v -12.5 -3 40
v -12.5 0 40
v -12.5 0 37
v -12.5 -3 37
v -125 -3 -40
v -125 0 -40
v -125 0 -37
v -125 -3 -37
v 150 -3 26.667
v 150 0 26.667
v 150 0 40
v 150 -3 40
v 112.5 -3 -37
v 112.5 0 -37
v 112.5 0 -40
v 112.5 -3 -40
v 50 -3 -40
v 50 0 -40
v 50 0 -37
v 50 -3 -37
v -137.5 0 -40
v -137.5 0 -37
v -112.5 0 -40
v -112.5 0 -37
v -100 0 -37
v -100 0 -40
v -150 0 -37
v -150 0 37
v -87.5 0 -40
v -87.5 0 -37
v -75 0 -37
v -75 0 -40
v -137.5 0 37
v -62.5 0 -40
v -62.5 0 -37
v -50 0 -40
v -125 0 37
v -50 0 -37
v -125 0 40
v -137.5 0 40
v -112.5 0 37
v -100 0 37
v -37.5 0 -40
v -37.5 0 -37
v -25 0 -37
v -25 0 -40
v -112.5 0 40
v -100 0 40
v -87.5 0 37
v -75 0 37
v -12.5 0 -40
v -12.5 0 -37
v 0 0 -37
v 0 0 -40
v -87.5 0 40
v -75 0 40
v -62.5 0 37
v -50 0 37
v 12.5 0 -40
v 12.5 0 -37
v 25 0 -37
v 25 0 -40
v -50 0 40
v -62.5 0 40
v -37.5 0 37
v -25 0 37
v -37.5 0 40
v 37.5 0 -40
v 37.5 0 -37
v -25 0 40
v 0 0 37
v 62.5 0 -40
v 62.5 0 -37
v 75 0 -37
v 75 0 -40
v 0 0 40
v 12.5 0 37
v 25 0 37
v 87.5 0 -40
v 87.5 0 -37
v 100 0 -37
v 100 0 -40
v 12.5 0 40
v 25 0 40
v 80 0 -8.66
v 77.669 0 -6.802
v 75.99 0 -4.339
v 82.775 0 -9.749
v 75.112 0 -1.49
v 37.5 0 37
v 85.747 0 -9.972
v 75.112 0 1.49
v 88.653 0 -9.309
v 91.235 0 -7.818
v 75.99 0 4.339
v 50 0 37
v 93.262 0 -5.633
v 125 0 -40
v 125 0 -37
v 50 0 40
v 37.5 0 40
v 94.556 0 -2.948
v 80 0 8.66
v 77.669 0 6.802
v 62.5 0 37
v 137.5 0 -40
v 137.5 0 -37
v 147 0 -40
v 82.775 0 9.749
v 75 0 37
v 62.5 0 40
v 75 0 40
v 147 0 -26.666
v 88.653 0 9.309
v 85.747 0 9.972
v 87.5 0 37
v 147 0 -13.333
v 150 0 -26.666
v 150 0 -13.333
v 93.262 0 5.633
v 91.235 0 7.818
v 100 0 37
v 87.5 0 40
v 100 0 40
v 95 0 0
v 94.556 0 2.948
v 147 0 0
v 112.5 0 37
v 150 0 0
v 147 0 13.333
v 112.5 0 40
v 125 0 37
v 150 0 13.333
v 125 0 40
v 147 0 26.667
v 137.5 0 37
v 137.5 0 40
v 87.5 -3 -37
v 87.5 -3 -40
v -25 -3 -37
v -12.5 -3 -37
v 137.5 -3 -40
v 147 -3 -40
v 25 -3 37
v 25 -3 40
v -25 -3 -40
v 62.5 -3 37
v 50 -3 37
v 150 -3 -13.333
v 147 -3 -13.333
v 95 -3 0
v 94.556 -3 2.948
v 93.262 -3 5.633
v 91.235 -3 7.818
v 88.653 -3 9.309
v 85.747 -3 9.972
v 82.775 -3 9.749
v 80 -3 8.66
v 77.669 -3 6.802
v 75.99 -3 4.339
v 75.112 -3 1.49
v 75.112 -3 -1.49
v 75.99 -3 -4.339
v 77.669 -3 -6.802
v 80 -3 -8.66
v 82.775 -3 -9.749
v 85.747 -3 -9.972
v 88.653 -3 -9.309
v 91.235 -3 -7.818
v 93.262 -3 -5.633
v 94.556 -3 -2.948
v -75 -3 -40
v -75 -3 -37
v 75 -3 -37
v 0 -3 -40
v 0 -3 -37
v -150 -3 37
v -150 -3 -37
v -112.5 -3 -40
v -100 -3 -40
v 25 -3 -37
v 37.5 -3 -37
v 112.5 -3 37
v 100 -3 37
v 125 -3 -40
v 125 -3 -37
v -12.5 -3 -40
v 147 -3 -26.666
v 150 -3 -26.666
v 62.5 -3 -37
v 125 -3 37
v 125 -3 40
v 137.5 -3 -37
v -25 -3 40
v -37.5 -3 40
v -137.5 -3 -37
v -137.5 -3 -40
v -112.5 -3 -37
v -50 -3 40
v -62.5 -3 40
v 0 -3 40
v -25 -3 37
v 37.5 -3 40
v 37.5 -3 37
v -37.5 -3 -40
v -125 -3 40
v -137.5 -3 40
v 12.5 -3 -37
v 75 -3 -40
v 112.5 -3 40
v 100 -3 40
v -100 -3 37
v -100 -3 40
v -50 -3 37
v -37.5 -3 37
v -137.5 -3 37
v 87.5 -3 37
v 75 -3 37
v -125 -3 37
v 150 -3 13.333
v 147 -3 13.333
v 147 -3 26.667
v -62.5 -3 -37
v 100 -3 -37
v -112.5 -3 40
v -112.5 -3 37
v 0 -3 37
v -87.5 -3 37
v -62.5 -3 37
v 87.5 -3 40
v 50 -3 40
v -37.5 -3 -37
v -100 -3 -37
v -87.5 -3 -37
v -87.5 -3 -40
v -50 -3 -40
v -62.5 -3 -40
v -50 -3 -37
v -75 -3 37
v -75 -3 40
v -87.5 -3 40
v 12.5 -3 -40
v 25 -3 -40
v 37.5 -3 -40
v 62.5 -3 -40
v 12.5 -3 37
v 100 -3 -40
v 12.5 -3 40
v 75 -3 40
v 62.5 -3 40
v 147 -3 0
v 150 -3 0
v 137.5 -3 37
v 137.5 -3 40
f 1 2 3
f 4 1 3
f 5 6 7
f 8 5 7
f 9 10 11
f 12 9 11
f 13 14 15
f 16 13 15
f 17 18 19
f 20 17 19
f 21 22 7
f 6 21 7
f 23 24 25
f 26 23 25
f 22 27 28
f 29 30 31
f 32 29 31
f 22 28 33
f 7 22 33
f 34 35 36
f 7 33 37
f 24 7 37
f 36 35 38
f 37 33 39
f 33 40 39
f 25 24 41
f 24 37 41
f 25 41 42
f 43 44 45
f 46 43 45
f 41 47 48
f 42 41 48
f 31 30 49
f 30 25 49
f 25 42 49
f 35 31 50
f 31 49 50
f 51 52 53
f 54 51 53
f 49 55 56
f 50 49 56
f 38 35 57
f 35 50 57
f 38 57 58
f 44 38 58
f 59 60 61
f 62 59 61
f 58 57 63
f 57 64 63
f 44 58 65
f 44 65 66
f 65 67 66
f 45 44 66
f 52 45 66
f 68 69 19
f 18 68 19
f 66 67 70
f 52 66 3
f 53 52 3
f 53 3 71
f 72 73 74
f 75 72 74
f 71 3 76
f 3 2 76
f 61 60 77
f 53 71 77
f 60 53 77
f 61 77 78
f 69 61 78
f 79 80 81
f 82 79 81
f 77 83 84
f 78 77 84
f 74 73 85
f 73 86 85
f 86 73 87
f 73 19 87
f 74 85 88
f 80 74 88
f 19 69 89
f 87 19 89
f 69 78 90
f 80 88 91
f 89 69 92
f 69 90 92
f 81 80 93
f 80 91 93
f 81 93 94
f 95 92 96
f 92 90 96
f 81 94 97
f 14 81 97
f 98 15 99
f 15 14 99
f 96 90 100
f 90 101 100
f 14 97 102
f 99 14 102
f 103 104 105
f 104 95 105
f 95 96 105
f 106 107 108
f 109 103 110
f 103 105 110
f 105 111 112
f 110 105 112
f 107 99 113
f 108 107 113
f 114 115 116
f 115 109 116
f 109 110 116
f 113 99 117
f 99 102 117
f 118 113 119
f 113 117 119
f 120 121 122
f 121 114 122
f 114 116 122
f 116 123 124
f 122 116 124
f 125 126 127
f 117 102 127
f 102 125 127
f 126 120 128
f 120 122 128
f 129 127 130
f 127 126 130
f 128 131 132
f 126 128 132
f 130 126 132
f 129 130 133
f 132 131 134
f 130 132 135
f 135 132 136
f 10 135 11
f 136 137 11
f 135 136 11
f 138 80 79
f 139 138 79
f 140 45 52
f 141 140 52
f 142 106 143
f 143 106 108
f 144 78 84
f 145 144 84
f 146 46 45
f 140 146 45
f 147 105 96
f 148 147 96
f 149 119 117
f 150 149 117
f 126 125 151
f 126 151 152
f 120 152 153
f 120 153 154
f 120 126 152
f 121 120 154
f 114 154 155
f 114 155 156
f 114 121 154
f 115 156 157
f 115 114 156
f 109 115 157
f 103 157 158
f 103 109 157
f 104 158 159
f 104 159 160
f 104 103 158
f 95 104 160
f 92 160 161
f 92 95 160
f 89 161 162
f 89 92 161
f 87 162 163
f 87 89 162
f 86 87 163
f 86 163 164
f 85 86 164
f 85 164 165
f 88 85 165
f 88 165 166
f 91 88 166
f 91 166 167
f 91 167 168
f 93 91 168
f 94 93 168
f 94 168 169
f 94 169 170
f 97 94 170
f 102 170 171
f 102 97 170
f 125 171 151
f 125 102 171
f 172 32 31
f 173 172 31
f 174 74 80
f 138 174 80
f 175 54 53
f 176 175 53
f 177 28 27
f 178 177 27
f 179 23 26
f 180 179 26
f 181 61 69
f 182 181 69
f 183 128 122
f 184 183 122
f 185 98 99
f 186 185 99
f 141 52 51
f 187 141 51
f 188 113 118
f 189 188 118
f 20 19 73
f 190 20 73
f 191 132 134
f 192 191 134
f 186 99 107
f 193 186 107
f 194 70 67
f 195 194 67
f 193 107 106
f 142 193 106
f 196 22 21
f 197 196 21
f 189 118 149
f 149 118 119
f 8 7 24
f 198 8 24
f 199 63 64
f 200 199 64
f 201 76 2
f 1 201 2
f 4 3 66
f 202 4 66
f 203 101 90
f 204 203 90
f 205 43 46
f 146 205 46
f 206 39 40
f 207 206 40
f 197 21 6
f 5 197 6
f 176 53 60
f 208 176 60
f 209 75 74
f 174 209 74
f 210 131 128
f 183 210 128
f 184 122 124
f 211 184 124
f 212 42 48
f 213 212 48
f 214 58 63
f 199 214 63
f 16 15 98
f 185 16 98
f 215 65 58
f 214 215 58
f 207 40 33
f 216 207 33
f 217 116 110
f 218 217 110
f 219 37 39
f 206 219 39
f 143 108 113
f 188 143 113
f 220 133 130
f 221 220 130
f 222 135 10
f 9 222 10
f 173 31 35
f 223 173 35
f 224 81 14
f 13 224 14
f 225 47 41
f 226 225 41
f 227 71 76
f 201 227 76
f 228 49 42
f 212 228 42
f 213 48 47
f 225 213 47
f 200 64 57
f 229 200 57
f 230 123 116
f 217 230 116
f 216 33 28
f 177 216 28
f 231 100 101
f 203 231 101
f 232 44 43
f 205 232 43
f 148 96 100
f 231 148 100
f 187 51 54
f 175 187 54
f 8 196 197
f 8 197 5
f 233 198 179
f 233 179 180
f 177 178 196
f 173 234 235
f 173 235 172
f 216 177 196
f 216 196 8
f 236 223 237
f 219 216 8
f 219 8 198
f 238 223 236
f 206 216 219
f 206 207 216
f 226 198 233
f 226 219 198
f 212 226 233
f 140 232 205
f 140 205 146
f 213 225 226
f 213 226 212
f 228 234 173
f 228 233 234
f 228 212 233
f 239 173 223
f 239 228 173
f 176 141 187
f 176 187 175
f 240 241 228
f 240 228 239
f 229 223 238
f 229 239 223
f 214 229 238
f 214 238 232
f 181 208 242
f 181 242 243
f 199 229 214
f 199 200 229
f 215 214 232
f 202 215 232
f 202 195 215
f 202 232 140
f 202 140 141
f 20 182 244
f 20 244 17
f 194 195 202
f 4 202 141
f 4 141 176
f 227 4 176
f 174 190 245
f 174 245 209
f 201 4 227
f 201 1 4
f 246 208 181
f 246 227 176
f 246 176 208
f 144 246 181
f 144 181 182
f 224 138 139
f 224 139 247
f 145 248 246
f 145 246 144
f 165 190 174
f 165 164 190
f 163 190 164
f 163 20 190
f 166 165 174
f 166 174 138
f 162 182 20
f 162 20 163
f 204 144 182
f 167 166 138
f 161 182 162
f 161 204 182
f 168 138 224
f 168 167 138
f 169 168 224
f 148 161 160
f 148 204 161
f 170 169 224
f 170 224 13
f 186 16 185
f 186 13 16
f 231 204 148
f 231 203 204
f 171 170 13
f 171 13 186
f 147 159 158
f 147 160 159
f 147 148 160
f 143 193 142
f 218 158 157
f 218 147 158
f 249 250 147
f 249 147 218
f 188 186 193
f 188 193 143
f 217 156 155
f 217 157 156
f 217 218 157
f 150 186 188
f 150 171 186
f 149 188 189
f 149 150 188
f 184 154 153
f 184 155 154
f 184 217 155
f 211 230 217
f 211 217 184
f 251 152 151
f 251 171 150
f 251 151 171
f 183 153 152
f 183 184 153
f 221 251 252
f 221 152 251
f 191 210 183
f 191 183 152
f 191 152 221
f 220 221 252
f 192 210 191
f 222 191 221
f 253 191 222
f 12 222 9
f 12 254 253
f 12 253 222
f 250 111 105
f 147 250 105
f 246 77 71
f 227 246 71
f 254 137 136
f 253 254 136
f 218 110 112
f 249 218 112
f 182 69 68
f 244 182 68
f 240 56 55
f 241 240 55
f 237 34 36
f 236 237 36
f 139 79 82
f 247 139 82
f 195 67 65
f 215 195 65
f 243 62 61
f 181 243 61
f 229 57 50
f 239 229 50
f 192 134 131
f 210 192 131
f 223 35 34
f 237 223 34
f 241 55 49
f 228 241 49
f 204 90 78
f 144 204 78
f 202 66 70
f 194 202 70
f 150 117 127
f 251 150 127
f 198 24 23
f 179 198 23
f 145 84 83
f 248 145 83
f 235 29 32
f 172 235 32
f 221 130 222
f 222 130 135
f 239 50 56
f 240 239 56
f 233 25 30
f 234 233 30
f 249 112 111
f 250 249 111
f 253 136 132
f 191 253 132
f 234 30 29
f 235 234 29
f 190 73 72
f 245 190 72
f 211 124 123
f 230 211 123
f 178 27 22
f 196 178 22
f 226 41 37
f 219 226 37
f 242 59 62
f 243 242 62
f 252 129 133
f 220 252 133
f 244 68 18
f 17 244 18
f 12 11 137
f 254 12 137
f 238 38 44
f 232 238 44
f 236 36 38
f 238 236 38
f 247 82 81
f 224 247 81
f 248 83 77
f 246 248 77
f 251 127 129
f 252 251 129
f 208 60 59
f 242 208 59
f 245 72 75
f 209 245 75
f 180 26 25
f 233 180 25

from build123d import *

# Parameters (mm, degrees)
F0_R     = 10
F1_DEPTH = 3


with BuildPart() as f1:
    # F0 (on Front) → F1 (new body)
    with BuildSketch(Plane.XZ):
        Polygon((147, -26.6665), (150, -26.6665), (150, -13.3332), (147, -13.3332), (147, 0.0001), (150, 0.0001), (150, 13.3334), (147, 13.3334), (147, 26.6667), (150, 26.6667), (150, 40), (137.5, 40), (137.5, 36.99985), (125, 36.99985), (125, 40), (112.5, 40), (112.5, 36.99985), (100, 36.99985), (100, 40), (87.5, 40), (87.5, 36.99985), (75, 36.99985), (75, 40), (62.5, 40), (62.5, 36.99985), (50, 36.99985), (50, 40), (37.5, 40), (37.5, 36.99985), (25, 36.99985), (25, 40), (12.5, 40), (12.5, 36.99985), (0, 36.99985), (0, 40), (-12.5, 40), (-12.5, 36.99985), (-25, 36.99985), (-25, 40), (-37.5, 40), (-37.5, 36.99985), (-50, 36.99985), (-50, 40), (-62.5, 40), (-62.5, 36.99985), (-75, 36.99985), (-75, 40), (-87.5, 40), (-87.5, 36.99985), (-100, 36.99985), (-100, 40), (-112.5, 40), (-112.5, 36.99985), (-125, 36.99985), (-125, 40), (-137.5, 40), (-137.5, 36.99985), (-150, 36.99985), (-150, -36.99985), (-137.5, -36.99985), (-137.5, -40), (-125, -40), (-125, -36.99985), (-112.5, -36.99985), (-112.5, -40), (-100, -40), (-100, -36.99985), (-87.5, -36.99985), (-87.5, -40), (-75, -40), (-75, -36.99985), (-62.5, -36.99985), (-62.5, -40), (-50, -40), (-50, -36.99985), (-37.5, -36.99985), (-37.5, -40), (-25, -40), (-25, -36.99985), (-12.5, -36.99985), (-12.5, -40), (0, -40), (0, -36.99985), (12.5, -36.99985), (12.5, -40), (25, -40), (25, -36.99985), (37.5, -36.99985), (37.5, -40), (50, -40), (50, -36.99985), (62.5, -36.99985), (62.5, -40), (75, -40), (75, -36.99985), (87.5, -36.99985), (87.5, -40), (100, -40), (100, -36.99985), (112.5, -36.99985), (112.5, -40), (125, -40), (125, -36.99985), (137.5, -36.99985), (137.5, -40), (147, -40), align=None)
        with Locations((85, 0)):
            Circle(F0_R, mode=Mode.SUBTRACT)
    extrude(amount=F1_DEPTH)


solid = f1.part
